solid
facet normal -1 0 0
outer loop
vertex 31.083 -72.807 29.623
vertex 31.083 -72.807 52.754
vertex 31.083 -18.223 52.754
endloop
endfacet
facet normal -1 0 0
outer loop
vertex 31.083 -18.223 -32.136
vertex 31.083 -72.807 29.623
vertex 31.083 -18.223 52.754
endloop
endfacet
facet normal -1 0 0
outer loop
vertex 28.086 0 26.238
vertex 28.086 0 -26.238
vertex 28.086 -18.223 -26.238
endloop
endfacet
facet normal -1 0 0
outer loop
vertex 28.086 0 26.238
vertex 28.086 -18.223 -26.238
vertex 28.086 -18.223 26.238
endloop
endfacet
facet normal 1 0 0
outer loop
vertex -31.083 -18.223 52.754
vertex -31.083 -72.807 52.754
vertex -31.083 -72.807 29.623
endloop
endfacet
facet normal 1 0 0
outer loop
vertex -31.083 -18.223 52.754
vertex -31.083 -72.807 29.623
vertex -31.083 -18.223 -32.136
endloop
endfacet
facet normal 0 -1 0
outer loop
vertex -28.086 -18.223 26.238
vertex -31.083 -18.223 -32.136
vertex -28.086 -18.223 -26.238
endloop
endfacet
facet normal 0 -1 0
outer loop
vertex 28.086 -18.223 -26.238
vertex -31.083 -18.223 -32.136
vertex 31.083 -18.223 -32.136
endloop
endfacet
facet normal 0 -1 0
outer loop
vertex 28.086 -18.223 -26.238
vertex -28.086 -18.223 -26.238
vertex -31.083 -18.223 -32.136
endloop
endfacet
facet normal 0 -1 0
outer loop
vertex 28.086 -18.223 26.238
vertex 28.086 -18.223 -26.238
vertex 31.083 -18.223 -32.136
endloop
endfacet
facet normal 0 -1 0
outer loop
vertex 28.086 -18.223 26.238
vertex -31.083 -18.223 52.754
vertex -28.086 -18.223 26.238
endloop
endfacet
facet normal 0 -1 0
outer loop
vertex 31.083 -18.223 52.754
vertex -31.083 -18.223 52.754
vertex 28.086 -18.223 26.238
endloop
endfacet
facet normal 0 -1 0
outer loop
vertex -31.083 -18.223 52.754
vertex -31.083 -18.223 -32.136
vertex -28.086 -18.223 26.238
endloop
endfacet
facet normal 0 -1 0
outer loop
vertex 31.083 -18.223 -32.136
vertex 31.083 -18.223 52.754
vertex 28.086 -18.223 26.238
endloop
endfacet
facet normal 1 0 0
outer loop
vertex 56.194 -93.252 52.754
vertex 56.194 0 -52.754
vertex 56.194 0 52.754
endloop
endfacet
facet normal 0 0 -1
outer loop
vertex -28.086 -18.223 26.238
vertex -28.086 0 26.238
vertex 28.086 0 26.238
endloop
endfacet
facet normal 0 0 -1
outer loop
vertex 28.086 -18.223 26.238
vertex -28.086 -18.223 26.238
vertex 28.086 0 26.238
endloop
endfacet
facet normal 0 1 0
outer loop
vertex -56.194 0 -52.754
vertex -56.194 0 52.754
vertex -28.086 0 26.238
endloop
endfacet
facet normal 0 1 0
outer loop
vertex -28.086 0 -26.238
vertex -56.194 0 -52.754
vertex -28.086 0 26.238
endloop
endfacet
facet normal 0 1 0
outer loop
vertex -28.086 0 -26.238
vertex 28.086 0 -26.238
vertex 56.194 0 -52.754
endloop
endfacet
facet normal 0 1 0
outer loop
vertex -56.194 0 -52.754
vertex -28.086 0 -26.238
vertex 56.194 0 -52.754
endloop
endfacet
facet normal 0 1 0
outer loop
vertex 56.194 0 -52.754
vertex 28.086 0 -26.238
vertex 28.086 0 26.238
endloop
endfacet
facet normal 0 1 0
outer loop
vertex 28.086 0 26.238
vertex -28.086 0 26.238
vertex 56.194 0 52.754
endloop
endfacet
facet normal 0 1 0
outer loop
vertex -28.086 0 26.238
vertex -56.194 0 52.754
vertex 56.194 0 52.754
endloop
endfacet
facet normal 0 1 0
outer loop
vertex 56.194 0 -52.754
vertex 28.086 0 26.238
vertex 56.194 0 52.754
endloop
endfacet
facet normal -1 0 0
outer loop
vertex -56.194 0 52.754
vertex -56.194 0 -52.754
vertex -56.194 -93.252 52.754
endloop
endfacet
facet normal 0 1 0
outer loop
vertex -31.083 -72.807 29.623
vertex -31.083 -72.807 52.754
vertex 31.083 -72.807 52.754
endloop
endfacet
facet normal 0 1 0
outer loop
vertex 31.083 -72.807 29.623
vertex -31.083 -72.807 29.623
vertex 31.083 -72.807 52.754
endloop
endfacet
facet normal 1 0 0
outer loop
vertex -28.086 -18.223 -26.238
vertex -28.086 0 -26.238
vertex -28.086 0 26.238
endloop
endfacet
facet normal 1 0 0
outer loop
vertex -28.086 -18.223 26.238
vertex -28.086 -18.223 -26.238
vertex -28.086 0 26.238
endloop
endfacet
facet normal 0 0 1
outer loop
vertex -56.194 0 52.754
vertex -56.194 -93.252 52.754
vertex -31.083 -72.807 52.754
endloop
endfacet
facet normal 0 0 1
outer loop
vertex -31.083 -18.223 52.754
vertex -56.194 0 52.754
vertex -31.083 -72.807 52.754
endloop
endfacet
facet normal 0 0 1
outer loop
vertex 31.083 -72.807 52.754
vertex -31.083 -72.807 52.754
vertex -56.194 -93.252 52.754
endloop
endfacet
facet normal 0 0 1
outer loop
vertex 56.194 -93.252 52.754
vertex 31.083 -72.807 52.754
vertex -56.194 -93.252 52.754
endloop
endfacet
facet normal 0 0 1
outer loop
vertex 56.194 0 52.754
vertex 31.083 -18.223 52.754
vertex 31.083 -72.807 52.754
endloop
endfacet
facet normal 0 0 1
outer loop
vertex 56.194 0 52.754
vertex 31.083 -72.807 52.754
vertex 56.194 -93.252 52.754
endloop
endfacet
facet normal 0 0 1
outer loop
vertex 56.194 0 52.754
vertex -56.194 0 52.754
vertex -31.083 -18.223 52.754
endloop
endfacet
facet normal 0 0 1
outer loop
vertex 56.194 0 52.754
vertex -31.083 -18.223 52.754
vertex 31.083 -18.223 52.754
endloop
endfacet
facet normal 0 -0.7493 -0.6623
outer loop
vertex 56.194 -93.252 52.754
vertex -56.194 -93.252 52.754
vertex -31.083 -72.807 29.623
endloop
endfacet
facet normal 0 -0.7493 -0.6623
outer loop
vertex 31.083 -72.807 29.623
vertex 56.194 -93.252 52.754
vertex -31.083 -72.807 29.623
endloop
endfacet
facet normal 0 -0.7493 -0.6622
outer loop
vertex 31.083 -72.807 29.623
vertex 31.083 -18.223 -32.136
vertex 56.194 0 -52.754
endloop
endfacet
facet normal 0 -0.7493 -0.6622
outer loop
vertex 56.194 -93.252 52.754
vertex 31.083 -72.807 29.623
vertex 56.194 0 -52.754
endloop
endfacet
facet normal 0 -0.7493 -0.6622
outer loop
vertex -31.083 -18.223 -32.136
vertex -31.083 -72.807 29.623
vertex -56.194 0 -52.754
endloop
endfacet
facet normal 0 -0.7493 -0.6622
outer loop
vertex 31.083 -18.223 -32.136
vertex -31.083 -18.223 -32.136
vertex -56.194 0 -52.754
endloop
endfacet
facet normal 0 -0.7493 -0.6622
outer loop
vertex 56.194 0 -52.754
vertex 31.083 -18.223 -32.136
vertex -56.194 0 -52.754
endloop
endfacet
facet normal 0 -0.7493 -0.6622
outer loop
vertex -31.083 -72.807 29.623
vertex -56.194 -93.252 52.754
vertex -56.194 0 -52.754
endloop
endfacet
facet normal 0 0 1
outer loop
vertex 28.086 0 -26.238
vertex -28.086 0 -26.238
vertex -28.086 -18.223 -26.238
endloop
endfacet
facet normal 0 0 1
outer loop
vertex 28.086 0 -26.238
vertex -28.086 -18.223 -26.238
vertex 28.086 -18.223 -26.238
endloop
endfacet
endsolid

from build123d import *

# Parameters (mm, degrees)
F0_W     = 112.387598
F0_H     = 105.508096
F0_W_2   = 56.171656
F0_H_2   = 52.476138
F1_DEPTH = 93.251504
F3_DEPTH = 50000
F4_W     = 62.165468
F4_H     = 54.584294
F5_DEPTH = 105.509097


with BuildPart() as f1:
    # F0 (on Front) → F1 (new body)
    with BuildSketch(Plane.XZ):
        Rectangle(F0_W, F0_H)
        Rectangle(F0_W_2, F0_H_2, mode=Mode.SUBTRACT)
    extrude(amount=F1_DEPTH)

    # F2 (on face) → F3 (cut, symmetric)
    with BuildSketch(Plane(origin=(-56.193799, 0, 0), x_dir=(0, -1, 0), z_dir=(-1, 0, 0))):
        Polygon((93.251504, 52.754048), (0, -52.754048), (93.251504, -52.754048), align=None)
    extrude(amount=F3_DEPTH, both=True, mode=Mode.SUBTRACT)

    # F4 (on face) → F5 (cut, through all)
    with BuildSketch(Plane.XY.offset(52.754048)):
        with Locations((0, -45.515299)):
            Rectangle(F4_W, F4_H)
    extrude(amount=-F5_DEPTH, mode=Mode.SUBTRACT)


solid = f1.part
